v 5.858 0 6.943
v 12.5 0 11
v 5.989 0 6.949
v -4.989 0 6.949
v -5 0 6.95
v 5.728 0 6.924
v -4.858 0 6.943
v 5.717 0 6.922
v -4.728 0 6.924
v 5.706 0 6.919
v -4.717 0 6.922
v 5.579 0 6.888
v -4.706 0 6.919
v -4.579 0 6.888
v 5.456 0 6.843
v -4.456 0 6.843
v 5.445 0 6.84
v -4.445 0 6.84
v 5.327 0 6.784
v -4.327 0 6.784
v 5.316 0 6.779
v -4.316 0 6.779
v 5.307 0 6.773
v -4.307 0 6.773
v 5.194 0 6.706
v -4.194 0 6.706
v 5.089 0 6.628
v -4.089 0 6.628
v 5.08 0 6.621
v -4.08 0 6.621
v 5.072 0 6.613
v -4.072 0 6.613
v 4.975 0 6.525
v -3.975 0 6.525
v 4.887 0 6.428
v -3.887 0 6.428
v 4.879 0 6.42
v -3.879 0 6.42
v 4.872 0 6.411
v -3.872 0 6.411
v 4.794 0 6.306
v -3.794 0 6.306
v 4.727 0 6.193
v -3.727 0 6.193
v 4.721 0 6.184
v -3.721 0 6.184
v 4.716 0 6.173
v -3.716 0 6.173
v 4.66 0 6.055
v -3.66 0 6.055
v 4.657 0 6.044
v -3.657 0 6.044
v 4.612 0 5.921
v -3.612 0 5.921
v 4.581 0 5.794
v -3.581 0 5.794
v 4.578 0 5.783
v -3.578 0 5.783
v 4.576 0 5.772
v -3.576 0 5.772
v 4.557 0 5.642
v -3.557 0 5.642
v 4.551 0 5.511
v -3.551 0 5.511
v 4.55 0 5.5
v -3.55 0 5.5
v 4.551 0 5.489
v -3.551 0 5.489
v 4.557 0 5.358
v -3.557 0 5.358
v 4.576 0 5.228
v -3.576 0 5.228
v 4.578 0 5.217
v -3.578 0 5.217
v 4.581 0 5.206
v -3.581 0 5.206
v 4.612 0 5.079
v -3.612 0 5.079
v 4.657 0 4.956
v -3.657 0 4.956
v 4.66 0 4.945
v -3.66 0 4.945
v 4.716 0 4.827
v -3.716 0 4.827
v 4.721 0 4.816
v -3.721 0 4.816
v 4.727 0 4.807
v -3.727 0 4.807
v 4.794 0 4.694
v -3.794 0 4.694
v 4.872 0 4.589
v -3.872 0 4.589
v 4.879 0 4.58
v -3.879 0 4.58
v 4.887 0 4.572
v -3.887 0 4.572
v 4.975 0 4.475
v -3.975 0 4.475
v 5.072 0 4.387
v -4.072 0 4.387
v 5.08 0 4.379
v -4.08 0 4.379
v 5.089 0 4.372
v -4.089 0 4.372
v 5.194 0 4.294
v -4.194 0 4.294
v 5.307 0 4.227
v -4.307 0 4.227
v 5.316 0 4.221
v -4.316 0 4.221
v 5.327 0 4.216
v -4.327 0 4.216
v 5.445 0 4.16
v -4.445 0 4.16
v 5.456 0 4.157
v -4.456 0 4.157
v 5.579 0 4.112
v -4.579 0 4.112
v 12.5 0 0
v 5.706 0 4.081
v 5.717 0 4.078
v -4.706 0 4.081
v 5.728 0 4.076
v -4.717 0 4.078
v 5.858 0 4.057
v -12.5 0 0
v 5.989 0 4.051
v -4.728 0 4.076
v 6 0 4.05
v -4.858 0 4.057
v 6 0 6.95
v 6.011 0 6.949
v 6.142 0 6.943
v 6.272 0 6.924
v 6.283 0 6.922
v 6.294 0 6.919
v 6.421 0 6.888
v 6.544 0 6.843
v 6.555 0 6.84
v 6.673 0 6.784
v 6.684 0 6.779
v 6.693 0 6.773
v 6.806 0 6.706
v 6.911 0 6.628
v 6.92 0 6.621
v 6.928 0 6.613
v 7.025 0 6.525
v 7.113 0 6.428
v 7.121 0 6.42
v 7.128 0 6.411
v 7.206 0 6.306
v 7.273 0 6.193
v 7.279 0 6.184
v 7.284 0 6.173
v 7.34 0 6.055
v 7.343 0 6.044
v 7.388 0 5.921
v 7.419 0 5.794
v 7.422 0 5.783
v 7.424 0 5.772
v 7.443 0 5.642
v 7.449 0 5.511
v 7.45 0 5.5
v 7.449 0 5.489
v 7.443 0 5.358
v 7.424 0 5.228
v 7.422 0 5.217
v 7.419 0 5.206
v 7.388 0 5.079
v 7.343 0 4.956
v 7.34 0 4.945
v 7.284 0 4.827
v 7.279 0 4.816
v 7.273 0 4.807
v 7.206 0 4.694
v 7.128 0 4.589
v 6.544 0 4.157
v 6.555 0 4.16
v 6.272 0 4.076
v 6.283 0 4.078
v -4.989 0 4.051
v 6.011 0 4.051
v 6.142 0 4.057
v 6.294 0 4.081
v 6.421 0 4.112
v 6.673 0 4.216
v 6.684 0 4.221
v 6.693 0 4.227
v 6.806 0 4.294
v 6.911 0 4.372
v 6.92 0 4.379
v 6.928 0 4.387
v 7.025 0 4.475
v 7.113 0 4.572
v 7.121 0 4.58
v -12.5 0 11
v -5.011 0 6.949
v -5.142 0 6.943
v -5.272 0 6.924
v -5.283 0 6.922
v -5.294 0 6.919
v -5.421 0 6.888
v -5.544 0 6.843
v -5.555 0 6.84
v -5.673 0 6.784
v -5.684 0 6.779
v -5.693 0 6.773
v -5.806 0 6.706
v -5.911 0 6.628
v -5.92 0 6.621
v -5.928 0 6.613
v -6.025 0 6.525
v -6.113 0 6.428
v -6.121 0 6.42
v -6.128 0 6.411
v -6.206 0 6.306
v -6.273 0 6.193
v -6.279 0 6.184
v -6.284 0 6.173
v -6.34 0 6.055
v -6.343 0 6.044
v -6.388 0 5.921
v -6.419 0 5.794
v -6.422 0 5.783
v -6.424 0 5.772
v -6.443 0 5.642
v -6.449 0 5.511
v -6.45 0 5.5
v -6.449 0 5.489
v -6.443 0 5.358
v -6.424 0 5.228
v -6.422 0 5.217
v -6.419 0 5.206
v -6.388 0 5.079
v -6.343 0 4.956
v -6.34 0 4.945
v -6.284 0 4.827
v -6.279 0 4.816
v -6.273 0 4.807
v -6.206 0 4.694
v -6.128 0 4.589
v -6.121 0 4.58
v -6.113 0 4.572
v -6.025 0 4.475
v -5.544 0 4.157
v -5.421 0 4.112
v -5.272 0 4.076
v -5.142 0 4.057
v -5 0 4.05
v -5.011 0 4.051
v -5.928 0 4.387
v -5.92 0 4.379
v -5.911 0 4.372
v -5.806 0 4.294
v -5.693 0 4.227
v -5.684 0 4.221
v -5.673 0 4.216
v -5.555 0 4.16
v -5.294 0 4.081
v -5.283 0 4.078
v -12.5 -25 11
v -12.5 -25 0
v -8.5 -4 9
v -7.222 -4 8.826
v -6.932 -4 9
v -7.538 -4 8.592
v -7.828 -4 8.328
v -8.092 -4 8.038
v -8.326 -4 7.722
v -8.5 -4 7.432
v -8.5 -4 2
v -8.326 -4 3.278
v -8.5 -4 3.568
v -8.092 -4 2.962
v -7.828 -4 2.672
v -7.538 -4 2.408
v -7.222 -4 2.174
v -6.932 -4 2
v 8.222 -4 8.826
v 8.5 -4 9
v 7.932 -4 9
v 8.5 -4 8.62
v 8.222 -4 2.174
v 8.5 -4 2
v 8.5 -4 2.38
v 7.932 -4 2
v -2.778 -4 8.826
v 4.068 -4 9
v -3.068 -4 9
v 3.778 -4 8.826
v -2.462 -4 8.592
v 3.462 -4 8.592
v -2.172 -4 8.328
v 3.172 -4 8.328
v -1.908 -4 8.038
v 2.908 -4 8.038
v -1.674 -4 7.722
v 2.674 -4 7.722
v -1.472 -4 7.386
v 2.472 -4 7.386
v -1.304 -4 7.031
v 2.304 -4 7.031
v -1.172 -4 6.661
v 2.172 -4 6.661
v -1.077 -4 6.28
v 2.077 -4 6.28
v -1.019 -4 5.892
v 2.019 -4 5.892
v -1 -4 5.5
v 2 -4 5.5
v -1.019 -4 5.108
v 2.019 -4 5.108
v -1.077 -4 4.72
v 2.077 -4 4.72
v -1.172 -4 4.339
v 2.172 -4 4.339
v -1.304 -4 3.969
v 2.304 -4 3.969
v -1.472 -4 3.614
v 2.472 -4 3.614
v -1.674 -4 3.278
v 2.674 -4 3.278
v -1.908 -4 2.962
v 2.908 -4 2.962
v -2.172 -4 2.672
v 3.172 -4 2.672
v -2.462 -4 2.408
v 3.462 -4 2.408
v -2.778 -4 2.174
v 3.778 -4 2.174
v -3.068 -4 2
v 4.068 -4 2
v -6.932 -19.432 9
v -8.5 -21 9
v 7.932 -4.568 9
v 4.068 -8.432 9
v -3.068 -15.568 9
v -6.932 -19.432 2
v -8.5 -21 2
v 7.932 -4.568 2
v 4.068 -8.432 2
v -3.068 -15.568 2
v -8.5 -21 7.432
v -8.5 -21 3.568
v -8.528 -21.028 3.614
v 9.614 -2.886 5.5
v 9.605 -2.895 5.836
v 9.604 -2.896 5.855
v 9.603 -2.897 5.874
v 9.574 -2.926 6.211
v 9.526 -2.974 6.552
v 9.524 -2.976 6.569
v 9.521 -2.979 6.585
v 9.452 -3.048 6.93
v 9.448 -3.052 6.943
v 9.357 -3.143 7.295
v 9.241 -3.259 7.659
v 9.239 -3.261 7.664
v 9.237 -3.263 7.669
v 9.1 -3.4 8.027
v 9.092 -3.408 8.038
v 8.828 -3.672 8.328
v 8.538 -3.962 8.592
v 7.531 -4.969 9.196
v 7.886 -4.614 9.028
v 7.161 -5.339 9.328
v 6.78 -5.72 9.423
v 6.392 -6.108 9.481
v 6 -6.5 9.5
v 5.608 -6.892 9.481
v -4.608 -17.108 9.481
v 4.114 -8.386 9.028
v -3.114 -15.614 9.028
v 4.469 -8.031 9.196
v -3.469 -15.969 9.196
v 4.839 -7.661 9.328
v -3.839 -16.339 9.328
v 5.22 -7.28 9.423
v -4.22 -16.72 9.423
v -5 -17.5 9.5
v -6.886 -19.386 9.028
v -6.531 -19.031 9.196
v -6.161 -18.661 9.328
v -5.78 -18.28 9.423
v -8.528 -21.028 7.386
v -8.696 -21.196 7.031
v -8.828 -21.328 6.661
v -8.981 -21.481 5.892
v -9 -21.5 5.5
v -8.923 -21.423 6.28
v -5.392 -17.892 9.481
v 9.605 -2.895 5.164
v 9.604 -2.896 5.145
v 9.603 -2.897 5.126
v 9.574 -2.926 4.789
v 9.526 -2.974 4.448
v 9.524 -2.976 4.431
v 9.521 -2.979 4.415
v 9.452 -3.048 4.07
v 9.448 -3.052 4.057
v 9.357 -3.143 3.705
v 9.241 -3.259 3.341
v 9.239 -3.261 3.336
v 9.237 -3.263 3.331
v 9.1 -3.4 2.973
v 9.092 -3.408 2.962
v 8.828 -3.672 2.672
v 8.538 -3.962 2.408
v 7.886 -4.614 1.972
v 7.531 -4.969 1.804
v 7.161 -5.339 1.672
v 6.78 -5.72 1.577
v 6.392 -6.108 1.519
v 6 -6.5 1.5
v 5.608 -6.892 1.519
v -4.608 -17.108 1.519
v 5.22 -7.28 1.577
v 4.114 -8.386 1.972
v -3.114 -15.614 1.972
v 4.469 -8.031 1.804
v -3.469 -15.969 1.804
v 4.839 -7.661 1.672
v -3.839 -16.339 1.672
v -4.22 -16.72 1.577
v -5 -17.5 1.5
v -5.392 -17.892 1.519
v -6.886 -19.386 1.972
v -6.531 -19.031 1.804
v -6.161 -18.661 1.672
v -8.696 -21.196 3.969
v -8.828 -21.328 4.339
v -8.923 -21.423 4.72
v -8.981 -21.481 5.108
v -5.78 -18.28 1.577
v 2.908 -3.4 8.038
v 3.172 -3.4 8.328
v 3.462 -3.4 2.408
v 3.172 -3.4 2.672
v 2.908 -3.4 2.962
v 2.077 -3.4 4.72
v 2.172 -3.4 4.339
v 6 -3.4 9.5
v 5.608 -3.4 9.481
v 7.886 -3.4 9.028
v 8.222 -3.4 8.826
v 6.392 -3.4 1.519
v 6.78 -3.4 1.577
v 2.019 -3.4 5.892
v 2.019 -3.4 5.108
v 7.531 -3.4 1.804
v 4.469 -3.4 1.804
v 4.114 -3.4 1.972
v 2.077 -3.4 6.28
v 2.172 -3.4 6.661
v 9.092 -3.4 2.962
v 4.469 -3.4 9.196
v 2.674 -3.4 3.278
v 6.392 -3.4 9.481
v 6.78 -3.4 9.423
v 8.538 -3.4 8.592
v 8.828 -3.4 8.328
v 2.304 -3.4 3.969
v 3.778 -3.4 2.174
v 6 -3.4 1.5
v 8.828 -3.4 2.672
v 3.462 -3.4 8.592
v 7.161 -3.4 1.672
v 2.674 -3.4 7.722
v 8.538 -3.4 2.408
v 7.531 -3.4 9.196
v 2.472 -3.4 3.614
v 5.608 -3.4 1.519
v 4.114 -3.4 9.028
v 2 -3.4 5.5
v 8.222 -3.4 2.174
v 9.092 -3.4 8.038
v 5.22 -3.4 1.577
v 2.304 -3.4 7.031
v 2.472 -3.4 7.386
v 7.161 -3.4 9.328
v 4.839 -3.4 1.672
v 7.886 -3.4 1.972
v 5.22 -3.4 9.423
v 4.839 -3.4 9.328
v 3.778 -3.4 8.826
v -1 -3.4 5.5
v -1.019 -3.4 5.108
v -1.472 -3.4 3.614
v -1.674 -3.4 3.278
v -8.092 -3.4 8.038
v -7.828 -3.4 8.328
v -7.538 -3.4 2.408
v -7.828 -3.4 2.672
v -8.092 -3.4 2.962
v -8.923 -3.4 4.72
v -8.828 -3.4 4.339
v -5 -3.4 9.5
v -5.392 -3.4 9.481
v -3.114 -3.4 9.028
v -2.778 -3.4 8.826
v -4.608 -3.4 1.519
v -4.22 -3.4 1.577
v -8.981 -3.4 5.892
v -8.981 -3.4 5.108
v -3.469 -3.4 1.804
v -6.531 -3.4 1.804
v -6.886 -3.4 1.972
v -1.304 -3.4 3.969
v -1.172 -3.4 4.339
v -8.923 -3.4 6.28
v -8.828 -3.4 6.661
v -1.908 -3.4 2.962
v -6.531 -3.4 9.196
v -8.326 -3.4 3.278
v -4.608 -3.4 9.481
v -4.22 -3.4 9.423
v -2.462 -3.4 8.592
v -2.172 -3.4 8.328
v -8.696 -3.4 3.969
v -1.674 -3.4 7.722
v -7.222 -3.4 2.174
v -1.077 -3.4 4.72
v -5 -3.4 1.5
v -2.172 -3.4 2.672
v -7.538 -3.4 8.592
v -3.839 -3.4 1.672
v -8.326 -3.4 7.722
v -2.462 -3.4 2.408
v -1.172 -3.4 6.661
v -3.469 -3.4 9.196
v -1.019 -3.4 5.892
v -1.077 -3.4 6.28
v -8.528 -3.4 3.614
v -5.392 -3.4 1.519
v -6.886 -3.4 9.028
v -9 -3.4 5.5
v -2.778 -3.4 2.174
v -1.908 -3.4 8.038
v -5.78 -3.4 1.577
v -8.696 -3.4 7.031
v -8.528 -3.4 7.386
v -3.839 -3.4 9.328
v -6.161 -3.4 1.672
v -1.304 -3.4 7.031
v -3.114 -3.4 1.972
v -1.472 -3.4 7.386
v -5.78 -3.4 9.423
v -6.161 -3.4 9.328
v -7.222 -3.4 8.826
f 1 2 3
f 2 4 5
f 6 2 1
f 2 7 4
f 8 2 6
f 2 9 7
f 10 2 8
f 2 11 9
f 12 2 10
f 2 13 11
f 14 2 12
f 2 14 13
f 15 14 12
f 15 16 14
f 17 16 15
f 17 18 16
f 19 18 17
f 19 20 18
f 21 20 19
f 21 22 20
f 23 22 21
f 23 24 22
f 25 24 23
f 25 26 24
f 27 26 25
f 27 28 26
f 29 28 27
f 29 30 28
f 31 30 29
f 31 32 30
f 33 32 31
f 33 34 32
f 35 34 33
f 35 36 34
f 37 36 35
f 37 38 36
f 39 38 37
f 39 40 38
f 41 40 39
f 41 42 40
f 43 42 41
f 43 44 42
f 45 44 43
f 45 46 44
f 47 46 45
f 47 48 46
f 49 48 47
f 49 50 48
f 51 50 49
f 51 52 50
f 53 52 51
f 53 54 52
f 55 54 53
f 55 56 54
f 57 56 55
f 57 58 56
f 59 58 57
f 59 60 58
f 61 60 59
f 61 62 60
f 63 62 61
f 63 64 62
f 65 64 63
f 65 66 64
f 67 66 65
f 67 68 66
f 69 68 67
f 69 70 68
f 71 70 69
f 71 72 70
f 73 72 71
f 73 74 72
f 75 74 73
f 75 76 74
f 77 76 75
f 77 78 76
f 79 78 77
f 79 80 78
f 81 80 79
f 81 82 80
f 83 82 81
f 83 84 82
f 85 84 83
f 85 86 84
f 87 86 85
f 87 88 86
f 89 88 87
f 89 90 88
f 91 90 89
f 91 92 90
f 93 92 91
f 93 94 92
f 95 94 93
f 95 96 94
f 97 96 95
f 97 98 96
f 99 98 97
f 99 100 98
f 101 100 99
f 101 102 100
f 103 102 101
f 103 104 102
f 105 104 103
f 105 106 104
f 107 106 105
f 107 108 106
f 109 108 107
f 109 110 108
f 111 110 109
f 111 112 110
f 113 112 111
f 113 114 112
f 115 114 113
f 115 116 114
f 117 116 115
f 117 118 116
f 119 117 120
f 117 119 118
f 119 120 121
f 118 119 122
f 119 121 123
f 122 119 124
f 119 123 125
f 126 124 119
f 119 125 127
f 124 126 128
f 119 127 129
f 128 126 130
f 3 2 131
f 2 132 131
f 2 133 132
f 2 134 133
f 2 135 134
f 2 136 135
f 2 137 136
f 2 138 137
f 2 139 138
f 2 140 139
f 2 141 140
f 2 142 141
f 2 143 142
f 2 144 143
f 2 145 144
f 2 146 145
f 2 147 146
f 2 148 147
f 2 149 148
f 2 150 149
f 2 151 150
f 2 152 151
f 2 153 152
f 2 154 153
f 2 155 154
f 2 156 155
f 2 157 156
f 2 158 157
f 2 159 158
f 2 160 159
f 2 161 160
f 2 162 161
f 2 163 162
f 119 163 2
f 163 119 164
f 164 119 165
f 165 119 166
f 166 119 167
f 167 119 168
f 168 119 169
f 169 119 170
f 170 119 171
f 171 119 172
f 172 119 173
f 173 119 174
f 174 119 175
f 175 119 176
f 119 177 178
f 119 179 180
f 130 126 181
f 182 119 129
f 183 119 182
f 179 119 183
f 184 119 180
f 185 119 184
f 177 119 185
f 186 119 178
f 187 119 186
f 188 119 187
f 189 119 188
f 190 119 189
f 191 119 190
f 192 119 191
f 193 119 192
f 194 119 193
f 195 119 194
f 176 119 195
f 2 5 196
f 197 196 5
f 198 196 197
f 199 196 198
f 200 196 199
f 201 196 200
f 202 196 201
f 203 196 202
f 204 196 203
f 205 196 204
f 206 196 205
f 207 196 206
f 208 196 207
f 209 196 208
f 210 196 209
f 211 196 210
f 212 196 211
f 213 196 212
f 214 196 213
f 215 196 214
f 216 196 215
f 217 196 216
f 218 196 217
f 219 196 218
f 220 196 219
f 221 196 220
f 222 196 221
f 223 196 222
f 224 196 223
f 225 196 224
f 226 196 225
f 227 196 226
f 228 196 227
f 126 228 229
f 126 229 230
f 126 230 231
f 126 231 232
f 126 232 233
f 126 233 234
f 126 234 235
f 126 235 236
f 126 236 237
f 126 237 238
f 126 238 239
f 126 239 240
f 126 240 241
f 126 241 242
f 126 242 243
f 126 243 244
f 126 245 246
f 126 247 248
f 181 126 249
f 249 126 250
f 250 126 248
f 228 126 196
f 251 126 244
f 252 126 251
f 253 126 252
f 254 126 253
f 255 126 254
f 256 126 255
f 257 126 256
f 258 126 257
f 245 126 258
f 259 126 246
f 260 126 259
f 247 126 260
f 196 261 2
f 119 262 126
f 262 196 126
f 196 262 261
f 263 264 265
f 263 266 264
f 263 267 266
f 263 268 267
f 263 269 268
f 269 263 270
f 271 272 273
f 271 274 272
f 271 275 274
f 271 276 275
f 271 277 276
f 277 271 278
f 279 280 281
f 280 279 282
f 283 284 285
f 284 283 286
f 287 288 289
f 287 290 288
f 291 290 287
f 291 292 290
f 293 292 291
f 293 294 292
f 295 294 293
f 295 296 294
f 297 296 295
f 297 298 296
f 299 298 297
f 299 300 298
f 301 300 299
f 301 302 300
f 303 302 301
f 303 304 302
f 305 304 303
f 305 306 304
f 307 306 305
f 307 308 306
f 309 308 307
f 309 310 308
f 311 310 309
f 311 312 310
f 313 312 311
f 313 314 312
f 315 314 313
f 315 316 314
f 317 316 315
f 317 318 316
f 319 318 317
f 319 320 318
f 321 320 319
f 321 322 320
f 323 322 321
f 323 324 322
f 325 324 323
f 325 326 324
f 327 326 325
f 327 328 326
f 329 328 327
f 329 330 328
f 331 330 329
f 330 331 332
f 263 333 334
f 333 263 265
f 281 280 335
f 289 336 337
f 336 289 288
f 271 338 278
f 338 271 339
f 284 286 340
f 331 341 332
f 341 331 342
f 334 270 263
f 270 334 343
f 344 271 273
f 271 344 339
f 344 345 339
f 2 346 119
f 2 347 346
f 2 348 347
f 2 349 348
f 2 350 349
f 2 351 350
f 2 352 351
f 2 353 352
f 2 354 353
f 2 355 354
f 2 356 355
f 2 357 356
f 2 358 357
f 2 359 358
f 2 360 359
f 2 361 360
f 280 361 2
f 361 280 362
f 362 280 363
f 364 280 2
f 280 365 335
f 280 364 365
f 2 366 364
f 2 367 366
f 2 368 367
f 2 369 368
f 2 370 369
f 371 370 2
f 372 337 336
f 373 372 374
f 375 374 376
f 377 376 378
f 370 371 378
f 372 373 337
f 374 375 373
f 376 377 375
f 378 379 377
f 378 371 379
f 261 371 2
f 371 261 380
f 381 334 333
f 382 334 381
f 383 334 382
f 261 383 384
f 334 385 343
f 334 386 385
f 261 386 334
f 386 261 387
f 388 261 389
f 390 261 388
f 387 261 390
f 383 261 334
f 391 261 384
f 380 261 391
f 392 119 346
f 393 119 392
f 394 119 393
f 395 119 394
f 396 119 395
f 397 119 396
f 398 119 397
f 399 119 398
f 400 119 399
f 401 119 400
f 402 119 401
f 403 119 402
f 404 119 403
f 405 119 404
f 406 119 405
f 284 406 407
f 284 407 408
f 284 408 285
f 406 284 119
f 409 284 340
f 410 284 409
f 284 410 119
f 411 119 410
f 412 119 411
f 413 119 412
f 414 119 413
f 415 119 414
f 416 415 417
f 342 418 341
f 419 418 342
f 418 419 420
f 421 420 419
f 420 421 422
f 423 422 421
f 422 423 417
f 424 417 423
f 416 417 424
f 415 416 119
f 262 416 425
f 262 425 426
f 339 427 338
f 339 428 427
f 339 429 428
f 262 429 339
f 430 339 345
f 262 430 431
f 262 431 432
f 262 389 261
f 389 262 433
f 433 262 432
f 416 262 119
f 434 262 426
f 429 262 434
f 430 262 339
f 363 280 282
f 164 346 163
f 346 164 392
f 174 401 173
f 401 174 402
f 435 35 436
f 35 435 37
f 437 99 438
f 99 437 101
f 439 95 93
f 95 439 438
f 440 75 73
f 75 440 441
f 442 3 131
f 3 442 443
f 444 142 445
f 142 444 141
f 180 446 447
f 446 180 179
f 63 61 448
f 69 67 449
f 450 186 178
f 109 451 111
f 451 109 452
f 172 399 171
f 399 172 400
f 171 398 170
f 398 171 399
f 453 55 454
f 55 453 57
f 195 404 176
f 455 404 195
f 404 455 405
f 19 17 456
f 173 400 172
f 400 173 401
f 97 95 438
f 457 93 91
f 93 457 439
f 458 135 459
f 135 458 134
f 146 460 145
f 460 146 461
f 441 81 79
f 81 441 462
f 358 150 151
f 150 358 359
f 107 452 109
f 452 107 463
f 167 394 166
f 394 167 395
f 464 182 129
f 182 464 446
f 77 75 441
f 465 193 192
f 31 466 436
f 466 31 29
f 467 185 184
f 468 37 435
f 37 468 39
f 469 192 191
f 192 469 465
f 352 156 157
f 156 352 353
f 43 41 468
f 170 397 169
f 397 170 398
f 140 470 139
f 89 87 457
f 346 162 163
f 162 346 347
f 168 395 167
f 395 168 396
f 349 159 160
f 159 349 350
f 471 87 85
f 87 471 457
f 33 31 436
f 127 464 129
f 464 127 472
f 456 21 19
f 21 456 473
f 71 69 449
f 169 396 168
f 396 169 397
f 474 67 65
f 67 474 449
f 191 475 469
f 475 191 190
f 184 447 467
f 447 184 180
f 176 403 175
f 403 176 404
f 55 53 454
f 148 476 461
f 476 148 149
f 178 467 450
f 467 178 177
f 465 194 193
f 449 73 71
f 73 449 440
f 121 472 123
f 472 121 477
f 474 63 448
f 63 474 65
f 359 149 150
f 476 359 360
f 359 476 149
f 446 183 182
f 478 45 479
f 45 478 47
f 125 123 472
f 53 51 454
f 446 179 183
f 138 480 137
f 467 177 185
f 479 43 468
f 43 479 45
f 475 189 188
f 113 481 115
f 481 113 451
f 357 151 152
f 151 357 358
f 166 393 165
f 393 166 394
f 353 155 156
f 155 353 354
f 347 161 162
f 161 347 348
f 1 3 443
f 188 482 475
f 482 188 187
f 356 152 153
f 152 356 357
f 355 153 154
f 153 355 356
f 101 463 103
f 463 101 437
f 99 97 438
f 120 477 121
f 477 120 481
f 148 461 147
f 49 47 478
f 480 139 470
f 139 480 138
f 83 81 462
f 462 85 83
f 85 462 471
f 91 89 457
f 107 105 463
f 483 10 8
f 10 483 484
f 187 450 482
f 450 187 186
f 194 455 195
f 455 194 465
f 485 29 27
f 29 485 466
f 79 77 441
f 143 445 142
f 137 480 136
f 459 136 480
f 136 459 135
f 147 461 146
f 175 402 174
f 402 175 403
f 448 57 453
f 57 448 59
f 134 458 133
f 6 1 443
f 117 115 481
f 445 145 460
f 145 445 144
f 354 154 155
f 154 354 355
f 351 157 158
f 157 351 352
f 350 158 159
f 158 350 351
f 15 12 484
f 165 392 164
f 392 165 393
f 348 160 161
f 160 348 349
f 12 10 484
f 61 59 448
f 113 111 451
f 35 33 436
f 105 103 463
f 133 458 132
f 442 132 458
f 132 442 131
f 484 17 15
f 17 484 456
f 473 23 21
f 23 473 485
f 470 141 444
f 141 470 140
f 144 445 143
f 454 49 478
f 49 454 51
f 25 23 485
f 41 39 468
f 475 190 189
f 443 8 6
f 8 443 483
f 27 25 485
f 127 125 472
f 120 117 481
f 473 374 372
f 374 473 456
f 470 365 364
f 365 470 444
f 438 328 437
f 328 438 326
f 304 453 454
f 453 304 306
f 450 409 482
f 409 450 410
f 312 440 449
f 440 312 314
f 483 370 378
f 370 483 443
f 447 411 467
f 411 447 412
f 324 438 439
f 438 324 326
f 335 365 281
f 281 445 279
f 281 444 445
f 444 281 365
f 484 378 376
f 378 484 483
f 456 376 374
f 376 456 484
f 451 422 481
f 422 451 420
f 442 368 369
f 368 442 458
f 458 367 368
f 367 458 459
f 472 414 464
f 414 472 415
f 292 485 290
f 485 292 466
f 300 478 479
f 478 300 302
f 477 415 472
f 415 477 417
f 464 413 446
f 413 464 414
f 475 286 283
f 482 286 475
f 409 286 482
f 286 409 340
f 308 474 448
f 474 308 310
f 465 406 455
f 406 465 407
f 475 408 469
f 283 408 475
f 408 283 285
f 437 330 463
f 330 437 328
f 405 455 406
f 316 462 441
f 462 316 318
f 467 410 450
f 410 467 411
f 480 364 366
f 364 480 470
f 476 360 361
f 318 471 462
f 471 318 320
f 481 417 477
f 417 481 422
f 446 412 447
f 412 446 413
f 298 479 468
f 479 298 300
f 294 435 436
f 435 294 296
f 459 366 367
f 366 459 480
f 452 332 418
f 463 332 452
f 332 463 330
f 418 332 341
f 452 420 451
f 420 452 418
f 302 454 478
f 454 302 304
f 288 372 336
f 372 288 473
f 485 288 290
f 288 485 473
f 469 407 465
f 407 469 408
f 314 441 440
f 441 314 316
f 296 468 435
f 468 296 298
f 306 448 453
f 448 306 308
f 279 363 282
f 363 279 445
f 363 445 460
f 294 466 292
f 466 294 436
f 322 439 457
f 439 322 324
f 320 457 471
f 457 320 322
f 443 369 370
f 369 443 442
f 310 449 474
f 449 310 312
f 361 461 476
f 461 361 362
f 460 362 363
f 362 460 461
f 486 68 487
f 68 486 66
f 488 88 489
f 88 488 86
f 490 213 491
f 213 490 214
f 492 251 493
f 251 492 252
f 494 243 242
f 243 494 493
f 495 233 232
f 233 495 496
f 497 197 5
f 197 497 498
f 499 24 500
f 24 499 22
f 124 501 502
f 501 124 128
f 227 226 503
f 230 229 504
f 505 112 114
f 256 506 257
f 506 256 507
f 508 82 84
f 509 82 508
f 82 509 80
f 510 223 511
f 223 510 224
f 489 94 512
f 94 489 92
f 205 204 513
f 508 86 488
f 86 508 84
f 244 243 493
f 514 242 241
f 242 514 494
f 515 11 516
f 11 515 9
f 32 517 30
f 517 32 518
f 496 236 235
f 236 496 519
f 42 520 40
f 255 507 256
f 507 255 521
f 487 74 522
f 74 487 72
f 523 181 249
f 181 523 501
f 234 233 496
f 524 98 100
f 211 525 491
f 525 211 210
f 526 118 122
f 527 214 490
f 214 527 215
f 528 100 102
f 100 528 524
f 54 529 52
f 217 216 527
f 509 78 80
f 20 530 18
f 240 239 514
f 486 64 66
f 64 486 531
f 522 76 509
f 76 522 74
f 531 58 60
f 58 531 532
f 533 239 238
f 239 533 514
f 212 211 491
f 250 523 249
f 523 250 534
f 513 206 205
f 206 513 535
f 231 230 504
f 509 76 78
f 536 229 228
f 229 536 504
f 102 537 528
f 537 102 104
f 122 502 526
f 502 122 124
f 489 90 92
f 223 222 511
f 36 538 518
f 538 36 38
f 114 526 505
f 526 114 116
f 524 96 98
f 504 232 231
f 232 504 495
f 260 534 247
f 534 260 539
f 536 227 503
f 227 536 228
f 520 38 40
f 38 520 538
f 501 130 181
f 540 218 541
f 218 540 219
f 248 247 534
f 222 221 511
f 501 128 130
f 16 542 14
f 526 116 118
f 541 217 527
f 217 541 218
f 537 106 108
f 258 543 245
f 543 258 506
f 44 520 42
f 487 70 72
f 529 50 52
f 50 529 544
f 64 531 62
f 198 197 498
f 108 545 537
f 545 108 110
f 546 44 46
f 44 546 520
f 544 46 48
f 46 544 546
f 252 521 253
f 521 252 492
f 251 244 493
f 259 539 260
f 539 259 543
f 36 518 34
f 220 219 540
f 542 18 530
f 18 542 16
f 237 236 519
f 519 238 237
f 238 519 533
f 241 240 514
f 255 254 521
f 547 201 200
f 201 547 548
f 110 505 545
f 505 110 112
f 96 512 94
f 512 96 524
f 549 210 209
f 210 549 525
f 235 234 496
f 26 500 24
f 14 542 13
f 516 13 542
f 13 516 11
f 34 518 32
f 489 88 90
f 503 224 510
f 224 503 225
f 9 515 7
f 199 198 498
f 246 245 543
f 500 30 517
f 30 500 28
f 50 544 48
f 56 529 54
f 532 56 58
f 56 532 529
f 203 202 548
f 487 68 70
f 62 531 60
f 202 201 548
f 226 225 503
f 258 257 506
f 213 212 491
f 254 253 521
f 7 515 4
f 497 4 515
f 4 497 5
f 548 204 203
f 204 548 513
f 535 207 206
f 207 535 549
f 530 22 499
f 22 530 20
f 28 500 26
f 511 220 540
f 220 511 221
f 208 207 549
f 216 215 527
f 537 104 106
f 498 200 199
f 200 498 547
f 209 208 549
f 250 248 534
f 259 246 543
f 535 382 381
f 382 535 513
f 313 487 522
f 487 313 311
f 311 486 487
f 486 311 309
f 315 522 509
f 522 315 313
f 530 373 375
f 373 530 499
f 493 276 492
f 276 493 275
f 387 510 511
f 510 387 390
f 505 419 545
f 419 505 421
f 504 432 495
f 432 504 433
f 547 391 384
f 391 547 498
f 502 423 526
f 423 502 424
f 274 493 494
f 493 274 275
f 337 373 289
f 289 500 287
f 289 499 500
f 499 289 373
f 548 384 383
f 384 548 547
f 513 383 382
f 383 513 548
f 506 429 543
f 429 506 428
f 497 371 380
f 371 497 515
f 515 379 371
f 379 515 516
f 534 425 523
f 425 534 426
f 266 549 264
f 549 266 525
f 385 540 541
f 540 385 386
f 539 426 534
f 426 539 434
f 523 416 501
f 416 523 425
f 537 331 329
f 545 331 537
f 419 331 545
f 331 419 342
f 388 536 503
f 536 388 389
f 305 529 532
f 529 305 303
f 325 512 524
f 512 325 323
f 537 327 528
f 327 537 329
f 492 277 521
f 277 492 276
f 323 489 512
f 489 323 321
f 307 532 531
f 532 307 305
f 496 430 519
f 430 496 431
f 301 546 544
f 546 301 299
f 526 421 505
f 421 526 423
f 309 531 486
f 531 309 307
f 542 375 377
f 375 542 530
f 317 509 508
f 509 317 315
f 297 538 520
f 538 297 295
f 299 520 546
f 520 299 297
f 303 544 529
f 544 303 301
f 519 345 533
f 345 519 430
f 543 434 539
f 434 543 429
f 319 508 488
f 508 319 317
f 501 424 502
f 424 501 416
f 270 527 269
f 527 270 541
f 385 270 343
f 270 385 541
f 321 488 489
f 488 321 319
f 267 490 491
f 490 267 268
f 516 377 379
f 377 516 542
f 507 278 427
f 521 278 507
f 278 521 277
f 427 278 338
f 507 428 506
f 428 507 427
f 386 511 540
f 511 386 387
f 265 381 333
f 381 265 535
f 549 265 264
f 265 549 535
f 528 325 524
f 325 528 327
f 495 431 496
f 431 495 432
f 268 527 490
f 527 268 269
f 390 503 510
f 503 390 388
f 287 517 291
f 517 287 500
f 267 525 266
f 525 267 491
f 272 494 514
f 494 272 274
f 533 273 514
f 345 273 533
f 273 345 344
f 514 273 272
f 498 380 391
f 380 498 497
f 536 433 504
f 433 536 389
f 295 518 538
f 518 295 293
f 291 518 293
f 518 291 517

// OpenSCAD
difference() {
    translate([0, -0.5 * 25, 0]) rotate([0, 0, 45]) difference() {
        rotate([0, 0, 45]) 
            translate([-0.5 * 25, -0.5 * 25, 0]) difference() {
                cube([25, 25, 11]);
                translate([0, 0, 2]) cube([21, 21, 7]);
            }
       translate([-50, -100, -15]) cube([100, 100, 30]);
       
    }
    translate([6, -3.4, 11 * 0.5]) rotate([-90, 0, 0]) #union() {
        cylinder(d1=8, d2=2.75, h=3.5, $fn=64);
        translate([0, 0, -20]) cylinder(d=8, h=20, $fn=64);
    }
    translate([-5, -3.4, 11 * 0.5]) rotate([-90, 0, 0]) #union() {
        cylinder(d1=8, d2=2.75, h=3.5, $fn=64);
        translate([0, 0, -20]) cylinder(d=8, h=20, $fn=64);
    }
}
